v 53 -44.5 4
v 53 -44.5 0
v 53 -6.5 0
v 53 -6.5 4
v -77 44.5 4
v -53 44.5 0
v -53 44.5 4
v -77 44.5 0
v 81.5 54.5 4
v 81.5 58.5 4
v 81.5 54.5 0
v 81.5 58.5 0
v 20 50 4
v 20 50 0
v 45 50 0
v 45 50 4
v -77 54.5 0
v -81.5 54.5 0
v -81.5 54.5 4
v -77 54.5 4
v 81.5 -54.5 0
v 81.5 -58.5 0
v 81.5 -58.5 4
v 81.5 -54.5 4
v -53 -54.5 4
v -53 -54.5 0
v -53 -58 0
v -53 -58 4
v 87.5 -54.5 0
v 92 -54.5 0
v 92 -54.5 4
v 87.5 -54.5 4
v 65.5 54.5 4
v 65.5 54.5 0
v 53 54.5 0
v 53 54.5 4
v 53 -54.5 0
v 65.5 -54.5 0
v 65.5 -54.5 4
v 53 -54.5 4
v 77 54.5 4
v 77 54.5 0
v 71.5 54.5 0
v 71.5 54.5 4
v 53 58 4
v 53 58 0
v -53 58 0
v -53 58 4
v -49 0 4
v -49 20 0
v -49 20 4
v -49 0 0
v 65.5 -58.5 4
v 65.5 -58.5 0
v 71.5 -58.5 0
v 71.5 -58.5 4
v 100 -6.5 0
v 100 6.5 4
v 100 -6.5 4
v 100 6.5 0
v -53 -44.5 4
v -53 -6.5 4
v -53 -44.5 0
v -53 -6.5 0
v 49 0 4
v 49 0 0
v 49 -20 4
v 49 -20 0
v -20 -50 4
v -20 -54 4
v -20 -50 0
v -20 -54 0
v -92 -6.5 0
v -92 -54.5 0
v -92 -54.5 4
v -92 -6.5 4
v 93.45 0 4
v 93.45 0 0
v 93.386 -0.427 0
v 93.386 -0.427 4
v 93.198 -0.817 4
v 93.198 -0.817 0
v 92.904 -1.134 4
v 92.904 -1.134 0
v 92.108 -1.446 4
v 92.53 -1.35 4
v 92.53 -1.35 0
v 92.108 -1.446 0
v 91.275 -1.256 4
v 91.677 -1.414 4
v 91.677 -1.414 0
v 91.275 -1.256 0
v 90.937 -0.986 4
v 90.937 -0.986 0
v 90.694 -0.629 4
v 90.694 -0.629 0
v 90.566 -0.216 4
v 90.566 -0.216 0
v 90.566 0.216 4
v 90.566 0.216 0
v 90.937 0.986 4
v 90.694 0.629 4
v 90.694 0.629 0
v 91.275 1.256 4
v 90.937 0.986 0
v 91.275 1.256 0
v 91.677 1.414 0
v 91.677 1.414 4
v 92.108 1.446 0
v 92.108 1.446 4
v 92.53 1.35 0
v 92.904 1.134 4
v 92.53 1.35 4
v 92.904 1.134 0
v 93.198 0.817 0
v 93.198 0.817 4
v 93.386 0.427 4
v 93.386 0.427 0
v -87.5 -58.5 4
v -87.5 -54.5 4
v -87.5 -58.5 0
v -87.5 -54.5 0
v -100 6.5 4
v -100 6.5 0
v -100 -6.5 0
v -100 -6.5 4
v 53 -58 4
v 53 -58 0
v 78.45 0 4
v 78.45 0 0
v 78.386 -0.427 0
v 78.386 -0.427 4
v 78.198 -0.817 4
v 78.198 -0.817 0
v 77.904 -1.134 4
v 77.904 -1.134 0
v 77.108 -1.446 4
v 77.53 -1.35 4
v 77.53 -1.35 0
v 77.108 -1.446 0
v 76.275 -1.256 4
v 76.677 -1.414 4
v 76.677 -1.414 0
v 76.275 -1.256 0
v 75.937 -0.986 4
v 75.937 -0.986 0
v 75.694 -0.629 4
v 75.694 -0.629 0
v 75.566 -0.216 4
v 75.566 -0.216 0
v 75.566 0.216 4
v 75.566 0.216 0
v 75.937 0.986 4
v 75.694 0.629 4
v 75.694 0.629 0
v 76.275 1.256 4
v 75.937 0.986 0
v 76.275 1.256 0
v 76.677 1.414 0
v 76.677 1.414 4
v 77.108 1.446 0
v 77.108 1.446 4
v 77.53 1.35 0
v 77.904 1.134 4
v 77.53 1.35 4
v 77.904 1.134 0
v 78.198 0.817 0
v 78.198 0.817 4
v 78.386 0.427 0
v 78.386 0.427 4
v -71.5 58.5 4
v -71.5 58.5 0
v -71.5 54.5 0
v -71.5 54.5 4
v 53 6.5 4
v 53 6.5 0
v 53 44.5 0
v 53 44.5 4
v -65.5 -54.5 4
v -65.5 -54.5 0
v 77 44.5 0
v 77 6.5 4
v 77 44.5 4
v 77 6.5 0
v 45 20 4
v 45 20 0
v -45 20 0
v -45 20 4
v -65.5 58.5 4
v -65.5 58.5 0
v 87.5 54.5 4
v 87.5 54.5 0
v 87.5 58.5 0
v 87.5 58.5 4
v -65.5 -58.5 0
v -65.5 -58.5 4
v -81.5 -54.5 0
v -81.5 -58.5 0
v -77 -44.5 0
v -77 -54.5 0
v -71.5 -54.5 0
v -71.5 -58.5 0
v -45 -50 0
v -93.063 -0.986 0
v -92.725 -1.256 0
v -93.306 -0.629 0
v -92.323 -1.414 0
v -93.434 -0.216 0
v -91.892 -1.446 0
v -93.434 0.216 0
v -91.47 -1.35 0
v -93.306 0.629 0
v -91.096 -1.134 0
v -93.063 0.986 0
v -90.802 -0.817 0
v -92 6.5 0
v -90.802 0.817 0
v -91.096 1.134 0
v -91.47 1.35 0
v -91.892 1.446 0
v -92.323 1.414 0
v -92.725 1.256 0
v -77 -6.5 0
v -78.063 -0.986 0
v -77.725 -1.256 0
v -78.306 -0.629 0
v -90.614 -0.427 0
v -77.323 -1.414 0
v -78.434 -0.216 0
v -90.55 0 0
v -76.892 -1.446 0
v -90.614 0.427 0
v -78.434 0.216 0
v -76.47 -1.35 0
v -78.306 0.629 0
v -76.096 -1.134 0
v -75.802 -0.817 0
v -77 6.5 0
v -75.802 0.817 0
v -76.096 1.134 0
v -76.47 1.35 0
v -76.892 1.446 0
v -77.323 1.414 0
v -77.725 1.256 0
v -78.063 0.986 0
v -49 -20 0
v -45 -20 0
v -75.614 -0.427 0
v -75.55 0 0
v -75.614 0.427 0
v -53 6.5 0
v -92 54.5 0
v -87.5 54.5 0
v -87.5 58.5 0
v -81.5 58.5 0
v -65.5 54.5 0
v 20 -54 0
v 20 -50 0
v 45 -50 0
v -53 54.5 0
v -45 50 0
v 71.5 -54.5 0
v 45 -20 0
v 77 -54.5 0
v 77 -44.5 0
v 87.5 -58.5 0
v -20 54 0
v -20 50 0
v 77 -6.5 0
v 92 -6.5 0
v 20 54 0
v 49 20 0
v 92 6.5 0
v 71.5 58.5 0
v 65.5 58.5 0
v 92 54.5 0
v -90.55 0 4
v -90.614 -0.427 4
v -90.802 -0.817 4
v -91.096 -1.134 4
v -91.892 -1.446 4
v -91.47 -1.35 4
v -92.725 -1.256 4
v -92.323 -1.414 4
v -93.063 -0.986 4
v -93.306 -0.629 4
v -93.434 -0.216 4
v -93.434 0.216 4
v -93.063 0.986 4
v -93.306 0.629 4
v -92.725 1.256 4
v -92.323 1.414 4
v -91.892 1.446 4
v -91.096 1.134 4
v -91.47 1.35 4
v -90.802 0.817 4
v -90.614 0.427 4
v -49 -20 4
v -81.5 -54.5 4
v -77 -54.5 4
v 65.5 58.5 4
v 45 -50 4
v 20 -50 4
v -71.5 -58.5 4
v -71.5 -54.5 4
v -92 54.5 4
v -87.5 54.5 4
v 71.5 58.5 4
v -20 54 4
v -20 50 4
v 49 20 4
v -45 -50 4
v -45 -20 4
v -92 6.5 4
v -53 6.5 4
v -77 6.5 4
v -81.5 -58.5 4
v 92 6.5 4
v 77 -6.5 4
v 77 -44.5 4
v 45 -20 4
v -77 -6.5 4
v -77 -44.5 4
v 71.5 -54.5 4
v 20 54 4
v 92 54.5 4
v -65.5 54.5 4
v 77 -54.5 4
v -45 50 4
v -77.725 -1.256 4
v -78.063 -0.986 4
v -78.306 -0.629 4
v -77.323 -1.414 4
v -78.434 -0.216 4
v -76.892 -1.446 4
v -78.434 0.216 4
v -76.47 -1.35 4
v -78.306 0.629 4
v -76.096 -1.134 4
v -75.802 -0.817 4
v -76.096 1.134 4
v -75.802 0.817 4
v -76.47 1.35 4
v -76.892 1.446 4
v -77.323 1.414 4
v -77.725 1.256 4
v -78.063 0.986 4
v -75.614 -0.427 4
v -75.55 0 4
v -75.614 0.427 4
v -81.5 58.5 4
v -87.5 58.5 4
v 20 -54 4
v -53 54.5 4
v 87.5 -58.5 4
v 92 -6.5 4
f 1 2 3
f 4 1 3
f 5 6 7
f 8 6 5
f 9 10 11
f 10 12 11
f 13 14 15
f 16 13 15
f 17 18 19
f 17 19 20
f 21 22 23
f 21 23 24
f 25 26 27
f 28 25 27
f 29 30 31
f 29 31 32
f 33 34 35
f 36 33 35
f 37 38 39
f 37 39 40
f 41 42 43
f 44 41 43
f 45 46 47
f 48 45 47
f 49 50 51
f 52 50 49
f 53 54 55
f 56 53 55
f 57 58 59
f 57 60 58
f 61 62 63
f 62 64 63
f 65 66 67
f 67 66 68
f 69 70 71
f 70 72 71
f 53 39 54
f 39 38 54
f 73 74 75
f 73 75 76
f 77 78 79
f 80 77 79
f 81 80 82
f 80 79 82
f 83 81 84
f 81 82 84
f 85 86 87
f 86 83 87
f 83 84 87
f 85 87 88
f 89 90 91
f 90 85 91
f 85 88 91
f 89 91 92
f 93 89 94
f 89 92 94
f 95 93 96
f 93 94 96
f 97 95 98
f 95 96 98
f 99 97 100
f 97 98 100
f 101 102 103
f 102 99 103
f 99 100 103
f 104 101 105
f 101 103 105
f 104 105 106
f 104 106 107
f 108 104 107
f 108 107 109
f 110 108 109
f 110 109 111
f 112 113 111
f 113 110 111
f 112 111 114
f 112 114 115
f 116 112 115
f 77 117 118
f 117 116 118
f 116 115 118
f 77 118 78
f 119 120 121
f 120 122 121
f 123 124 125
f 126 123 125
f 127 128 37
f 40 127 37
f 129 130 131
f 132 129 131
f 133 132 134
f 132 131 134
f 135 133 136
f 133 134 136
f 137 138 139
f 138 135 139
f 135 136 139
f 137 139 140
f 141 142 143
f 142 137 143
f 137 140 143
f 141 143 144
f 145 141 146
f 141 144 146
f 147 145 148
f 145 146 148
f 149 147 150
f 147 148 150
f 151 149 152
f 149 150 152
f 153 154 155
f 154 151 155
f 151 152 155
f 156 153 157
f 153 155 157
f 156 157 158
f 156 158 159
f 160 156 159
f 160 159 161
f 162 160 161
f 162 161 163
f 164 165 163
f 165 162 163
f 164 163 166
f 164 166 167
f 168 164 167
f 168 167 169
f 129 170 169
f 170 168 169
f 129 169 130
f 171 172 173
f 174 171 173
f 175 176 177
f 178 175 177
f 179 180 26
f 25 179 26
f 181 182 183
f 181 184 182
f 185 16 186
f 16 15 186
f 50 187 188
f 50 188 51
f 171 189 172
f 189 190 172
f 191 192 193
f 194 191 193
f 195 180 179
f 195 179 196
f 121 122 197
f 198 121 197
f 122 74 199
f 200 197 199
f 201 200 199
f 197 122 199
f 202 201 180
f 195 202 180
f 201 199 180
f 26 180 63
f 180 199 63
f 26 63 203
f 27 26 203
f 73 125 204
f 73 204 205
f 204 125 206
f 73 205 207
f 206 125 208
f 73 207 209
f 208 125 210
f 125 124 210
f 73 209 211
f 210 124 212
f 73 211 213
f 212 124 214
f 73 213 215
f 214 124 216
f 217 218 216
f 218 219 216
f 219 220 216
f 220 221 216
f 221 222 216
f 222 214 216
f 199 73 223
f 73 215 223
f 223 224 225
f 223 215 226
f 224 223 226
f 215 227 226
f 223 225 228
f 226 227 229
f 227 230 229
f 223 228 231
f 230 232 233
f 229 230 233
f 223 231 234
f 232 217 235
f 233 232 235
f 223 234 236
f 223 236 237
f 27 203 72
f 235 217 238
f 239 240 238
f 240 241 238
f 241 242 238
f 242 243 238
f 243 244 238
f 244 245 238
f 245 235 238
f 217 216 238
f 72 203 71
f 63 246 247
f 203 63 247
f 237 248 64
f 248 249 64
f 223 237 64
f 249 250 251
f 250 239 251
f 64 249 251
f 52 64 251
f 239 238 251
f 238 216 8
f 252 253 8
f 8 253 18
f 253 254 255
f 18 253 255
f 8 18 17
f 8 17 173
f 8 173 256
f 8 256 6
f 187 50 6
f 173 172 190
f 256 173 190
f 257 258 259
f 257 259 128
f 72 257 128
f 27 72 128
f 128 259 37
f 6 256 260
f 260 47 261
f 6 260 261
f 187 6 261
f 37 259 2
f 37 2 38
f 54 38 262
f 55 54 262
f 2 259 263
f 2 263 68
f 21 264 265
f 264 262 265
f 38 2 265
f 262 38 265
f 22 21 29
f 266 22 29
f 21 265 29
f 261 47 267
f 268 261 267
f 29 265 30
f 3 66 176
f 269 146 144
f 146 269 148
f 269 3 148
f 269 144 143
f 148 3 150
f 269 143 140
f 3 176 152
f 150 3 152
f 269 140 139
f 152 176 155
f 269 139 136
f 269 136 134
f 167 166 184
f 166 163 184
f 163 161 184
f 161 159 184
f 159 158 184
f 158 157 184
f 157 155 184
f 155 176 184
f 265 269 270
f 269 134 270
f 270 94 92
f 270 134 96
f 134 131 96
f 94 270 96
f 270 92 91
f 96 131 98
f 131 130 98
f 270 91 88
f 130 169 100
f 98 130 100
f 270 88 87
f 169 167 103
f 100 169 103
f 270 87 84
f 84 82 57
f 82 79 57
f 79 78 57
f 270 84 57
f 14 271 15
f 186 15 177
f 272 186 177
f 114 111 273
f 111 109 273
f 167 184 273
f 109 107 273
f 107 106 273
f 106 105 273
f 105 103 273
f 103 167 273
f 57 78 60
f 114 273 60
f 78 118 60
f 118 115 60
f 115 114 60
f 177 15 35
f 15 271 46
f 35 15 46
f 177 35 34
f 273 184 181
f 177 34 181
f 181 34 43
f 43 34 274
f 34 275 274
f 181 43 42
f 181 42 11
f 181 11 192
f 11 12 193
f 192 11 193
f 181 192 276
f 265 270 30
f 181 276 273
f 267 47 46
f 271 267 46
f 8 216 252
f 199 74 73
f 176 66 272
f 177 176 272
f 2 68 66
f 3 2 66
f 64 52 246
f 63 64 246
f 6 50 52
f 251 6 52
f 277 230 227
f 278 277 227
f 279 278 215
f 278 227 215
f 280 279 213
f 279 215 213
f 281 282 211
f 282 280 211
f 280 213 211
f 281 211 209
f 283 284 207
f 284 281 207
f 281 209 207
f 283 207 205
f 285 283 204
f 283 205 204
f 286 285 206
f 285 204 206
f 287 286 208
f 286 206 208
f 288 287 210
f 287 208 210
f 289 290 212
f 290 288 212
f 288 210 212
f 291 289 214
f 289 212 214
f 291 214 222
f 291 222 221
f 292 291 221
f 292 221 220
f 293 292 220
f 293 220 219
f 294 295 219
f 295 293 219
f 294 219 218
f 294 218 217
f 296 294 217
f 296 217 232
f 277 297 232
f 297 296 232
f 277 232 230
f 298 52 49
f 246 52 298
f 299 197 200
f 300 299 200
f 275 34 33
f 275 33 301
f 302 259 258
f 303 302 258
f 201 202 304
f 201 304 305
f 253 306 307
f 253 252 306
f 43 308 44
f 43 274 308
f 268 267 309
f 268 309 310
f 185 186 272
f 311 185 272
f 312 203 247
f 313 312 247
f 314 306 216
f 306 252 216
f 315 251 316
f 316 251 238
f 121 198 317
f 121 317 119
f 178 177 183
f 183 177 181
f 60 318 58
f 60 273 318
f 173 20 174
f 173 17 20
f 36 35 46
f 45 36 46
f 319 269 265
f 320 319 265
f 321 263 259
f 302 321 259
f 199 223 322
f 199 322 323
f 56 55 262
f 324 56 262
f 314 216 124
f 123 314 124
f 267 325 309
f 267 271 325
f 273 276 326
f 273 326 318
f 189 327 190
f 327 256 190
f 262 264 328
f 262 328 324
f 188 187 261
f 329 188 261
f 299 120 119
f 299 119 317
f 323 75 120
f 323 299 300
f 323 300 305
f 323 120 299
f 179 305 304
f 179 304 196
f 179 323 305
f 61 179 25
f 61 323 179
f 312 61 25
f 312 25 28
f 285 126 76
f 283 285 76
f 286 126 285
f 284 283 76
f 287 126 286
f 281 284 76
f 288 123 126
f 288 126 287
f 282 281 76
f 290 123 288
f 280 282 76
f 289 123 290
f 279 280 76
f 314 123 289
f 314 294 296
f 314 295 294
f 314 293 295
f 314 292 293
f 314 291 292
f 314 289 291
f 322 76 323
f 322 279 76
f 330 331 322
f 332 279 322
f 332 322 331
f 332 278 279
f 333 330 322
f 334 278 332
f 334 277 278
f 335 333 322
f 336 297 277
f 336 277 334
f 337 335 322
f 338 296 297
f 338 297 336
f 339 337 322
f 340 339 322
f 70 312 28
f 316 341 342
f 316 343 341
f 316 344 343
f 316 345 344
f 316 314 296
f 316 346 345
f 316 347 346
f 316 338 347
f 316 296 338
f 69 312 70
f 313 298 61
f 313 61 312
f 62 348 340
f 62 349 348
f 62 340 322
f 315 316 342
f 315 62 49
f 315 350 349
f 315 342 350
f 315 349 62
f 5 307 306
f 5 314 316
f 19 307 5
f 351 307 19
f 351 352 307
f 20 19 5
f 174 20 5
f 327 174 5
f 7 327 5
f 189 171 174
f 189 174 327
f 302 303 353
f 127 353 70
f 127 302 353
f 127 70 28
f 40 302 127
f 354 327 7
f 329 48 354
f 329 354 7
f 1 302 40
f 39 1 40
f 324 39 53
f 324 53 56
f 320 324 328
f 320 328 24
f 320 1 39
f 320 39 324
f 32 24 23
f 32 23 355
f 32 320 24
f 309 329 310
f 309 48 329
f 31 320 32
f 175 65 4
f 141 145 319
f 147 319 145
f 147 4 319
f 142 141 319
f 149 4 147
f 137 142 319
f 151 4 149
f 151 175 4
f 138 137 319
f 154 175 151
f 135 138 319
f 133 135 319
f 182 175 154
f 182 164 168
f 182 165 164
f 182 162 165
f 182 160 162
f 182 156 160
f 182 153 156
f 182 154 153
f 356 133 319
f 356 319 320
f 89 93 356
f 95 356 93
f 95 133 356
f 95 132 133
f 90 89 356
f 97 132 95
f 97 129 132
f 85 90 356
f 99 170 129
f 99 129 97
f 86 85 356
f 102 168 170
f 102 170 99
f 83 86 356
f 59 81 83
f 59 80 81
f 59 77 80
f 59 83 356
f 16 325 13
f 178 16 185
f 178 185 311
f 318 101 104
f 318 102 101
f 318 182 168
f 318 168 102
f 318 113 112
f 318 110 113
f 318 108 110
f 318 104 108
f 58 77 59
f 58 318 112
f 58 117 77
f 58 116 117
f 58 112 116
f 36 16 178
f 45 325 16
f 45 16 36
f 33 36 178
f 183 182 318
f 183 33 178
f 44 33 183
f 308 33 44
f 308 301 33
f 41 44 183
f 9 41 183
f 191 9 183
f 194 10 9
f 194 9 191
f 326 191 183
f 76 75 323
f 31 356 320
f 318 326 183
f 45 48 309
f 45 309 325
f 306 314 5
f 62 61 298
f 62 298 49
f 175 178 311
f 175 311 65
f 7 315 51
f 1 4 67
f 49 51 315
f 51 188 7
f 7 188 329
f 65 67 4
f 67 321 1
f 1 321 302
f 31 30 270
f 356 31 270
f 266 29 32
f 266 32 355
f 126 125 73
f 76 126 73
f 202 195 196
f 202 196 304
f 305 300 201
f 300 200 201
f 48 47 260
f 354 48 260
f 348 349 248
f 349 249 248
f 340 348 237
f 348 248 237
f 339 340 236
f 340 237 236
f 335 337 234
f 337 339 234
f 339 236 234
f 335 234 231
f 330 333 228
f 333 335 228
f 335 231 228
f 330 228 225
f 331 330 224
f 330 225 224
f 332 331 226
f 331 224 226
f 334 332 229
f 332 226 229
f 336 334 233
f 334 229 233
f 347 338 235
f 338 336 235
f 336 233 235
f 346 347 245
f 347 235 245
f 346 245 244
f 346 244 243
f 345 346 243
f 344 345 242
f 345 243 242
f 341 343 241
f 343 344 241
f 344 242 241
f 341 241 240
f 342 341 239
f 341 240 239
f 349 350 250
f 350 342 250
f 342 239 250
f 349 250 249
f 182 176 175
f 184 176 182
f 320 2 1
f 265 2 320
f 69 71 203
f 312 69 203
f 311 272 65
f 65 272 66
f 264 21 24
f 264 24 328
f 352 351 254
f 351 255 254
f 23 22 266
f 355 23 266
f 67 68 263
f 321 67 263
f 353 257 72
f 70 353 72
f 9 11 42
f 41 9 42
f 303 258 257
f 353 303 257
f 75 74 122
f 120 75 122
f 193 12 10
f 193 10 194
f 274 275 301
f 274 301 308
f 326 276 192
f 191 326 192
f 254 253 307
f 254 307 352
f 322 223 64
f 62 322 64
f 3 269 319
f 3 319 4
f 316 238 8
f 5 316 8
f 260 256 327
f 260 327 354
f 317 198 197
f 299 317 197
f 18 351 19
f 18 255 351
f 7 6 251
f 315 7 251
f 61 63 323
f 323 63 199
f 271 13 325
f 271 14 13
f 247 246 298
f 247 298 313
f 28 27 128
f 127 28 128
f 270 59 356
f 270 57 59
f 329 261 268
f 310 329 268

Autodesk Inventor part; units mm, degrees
ref_plane "YZ Plane" through (0, 0, 0) normal (1, 0, 0) x (0, 1, 0)
ref_plane "XZ Plane" through (0, 0, 0) normal (0, 1, 0) x (-1, 0, 0)
ref_plane "XY Plane" through (0, 0, 0) normal (0, 0, 1) x (1, 0, 0)
sketch "Sketch1" plane through (0, 0, 0) normal (0, 0, 1) x (1, 0, 0)
  line L0 (45, -50) -> (-45, -50)
  line L1 (-45, -50) -> (-45, 50)
  line L2 (-45, 50) -> (45, 50)
  line L3 (45, 50) -> (45, -50)
  line L4 (45, -50) -> (-45, 50) construction
  line L5 (-45, -50) -> (45, 50) construction
  line L6 (53, 58) -> (-53, 58)
  line L7 (-53, 58) -> (-53, 54.5)
  line L8 (-53, -58) -> (53, -58)
  line L9 (53, -58) -> (53, -54.5)
  line L10 (-20, 50) -> (20, 50)
  line L11 (20, 50) -> (20, 54)
  line L12 (20, 54) -> (-20, 54)
  line L13 (-20, 54) -> (-20, 50)
  line L14 (-20, -50) -> (20, -50)
  line L15 (20, -50) -> (20, -54)
  line L16 (20, -54) -> (-20, -54)
  line L17 (-20, -54) -> (-20, -50)
  line L18 (-45, 20) -> (-49, 20)
  line L19 (-49, 20) -> (-49, -20)
  line L20 (-49, -20) -> (-45, -20)
  line L21 (-45, -20) -> (-45, 20)
  line L22 (45, 20) -> (49, 20)
  line L23 (49, 20) -> (49, -20)
  line L24 (49, -20) -> (45, -20)
  line L25 (45, -20) -> (45, 20)
  line L26 (-53, 6.5) -> (-77, 6.5)
  line L27 (-100, 6.5) -> (-100, -6.5)
  line L28 (-100, -6.5) -> (-92, -6.5)
  line L29 (-53, -6.5) -> (-53, 6.5) construction
  line L30 (-53, 0) -> (53, 0)
  circle A0 centre (-92, 0) radius 1.45
  circle A1 centre (-77, 0) radius 1.45
  line L31 (0, 50) -> (0, -50)
  line L32 (-53, 6.5) -> (-53, -6.5) construction
  line L33 (-53, -6.5) -> (-53, -44.5)
  line L34 (53, 6.5) -> (53, 44.5)
  line L35 (53, -6.5) -> (53, 6.5) construction
  line L36 (-92, -6.5) -> (-77, -6.5) construction
  line L37 (-77, -6.5) -> (-77, -44.5)
  line L38 (-77, -58) -> (-92, -58) construction
  line L39 (-92, -58) -> (-92, -54.5) construction
  line L40 (-92, -58) -> (-77, -58) construction
  line L41 (-77, -58) -> (-77, -58.5) construction
  line L42 (-77, -58.5) -> (-81.5, -58.5) construction
  line L43 (-92, -58.5) -> (-92, -58) construction
  line L44 (-92, -54.5) -> (-87.5, -54.5)
  line L45 (-87.5, -54.5) -> (-87.5, -58.5)
  line L46 (-81.5, -58.5) -> (-81.5, -54.5)
  line L47 (-81.5, -54.5) -> (-77, -54.5)
  line L48 (-77, 6.5) -> (-77, 44.5)
  line L49 (-77, 58) -> (-92, 58) construction
  line L50 (-92, 58) -> (-92, 54.5) construction
  line L51 (-92, 58) -> (-77, 58) construction
  line L52 (-77, 58) -> (-77, 58.5) construction
  line L53 (-77, 58.5) -> (-81.5, 58.5) construction
  line L54 (-92, 58.5) -> (-92, 58) construction
  line L55 (-92, 54.5) -> (-87.5, 54.5)
  line L56 (-87.5, 54.5) -> (-87.5, 58.5)
  line L57 (-81.5, 58.5) -> (-81.5, 54.5)
  line L58 (-81.5, 54.5) -> (-77, 54.5)
  line L59 (-77, 6.5) -> (-92, 6.5) construction
  line L60 (-92, 6.5) -> (-100, 6.5)
  line L61 (-92, -6.5) -> (-77, -6.5) construction
  line L62 (-77, -6.5) -> (-53, -6.5)
  line L63 (-77, 54.5) -> (-77, 58) construction
  line L64 (-92, 54.5) -> (-92, 6.5)
  line L65 (-87.5, 58.5) -> (-92, 58.5) construction
  line L66 (-81.5, 58.5) -> (-87.5, 58.5)
  line L67 (-92, -54.5) -> (-92, -6.5)
  line L68 (-87.5, -58.5) -> (-92, -58.5) construction
  line L69 (-81.5, -58.5) -> (-87.5, -58.5)
  line L70 (-77, -54.5) -> (-77, -58) construction
  line L71 (-77, 54.5) -> (-71.5, 54.5)
  line L72 (-53, 54.5) -> (-53, 44.5) construction
  line L73 (-53, 44.5) -> (-77, 44.5)
  line L74 (-77, 44.5) -> (-77, 54.5) construction
  line L75 (-77, -54.5) -> (-71.5, -54.5)
  line L76 (-53, -54.5) -> (-53, -54)
  line L77 (-53, -44.5) -> (-77, -44.5)
  line L78 (-77, -44.5) -> (-77, -54.5) construction
  line L79 (-71.5, 54.5) -> (-65.5, 54.5) construction
  line L80 (-65.5, 54.5) -> (-65.5, 58.5)
  line L81 (-65.5, 58.5) -> (-71.5, 58.5)
  line L82 (-71.5, 58.5) -> (-71.5, 54.5)
  line L83 (-71.5, -54.5) -> (-65.5, -54.5) construction
  line L84 (-65.5, -54.5) -> (-65.5, -58.5)
  line L85 (-65.5, -58.5) -> (-71.5, -58.5)
  line L86 (-71.5, -58.5) -> (-71.5, -54.5)
  line L87 (-71.5, 54.5) -> (-65.5, 54.5) construction
  line L88 (-65.5, 54.5) -> (-53, 54.5)
  line L89 (-77, 44.5) -> (-77, 54.5) construction
  line L90 (-53, 44.5) -> (-53, 6.5)
  line L91 (-53, 54.5) -> (-53, 44.5) construction
  line L92 (-77, -44.5) -> (-77, -54.5) construction
  line L93 (-53, -44.5) -> (-53, -54.5) construction
  line L94 (-53, -54) -> (-53, -44.5) construction
  line L95 (-65.5, -54.5) -> (-53, -54.5)
  line L96 (-71.5, -54.5) -> (-65.5, -54.5) construction
  line L97 (-53, -54.5) -> (-53, -58)
  line L98 (53, 6.5) -> (77, 6.5)
  line L99 (100, 6.5) -> (100, -6.5)
  line L100 (100, -6.5) -> (92, -6.5)
  circle A2 centre (92, 0) radius 1.45
  circle A3 centre (77, 0) radius 1.45
  line L101 (92, -6.5) -> (77, -6.5) construction
  line L102 (77, -6.5) -> (77, -44.5)
  line L103 (77, -58) -> (92, -58) construction
  line L104 (92, -58) -> (92, -54.5) construction
  line L105 (92, -58) -> (77, -58) construction
  line L106 (77, -58) -> (77, -58.5) construction
  line L107 (77, -58.5) -> (81.5, -58.5) construction
  line L108 (92, -58.5) -> (92, -58) construction
  line L109 (92, -54.5) -> (87.5, -54.5)
  line L110 (87.5, -54.5) -> (87.5, -58.5)
  line L111 (81.5, -58.5) -> (81.5, -54.5)
  line L112 (81.5, -54.5) -> (77, -54.5)
  line L113 (92, 54.5) -> (87.5, 54.5)
  line L114 (92, 58) -> (92, 54.5) construction
  line L115 (77, 6.5) -> (77, 44.5)
  line L116 (81.5, 54.5) -> (77, 54.5)
  line L117 (77, 58) -> (92, 58) construction
  line L118 (92, 58) -> (77, 58) construction
  line L119 (77, 58) -> (77, 58.5) construction
  line L120 (77, 58.5) -> (81.5, 58.5) construction
  line L121 (81.5, 58.5) -> (81.5, 54.5)
  line L122 (92, 58.5) -> (92, 58) construction
  line L123 (87.5, 54.5) -> (87.5, 58.5)
  line L124 (77, 6.5) -> (92, 6.5) construction
  line L125 (92, 6.5) -> (100, 6.5)
  line L126 (92, -6.5) -> (77, -6.5) construction
  line L127 (77, -6.5) -> (53, -6.5)
  line L128 (77, 54.5) -> (77, 58) construction
  line L129 (92, 54.5) -> (92, 6.5)
  line L130 (87.5, 58.5) -> (92, 58.5) construction
  line L131 (81.5, 58.5) -> (87.5, 58.5)
  line L132 (92, -54.5) -> (92, -6.5)
  line L133 (87.5, -58.5) -> (92, -58.5) construction
  line L134 (81.5, -58.5) -> (87.5, -58.5)
  line L135 (77, -54.5) -> (77, -58) construction
  line L136 (77, 54.5) -> (71.5, 54.5)
  line L137 (53, 44.5) -> (77, 44.5)
  line L138 (77, 44.5) -> (77, 54.5) construction
  line L139 (77, -54.5) -> (71.5, -54.5)
  line L140 (53, -44.5) -> (77, -44.5)
  line L141 (77, -44.5) -> (77, -54.5) construction
  line L142 (71.5, 54.5) -> (65.5, 54.5) construction
  line L143 (65.5, 54.5) -> (65.5, 58.5)
  line L144 (65.5, 58.5) -> (71.5, 58.5)
  line L145 (71.5, 58.5) -> (71.5, 54.5)
  line L146 (71.5, -54.5) -> (65.5, -54.5) construction
  line L147 (65.5, -54.5) -> (65.5, -58.5)
  line L148 (65.5, -58.5) -> (71.5, -58.5)
  line L149 (71.5, -58.5) -> (71.5, -54.5)
  line L150 (71.5, 54.5) -> (65.5, 54.5) construction
  line L151 (65.5, 54.5) -> (53, 54.5)
  line L152 (77, 44.5) -> (77, 54.5) construction
  line L153 (77, -44.5) -> (77, -54.5) construction
  line L154 (65.5, -54.5) -> (53, -54.5)
  line L155 (71.5, -54.5) -> (65.5, -54.5) construction
  line L156 (53, 44.5) -> (53, 54.5) construction
  line L157 (53, 54.5) -> (53, 58)
  line L158 (53, -44.5) -> (53, -6.5)
  line L159 (53, -54.5) -> (53, -44.5) construction
  point P0 (0, 0)
  point P1 (0, 54)
  point P2 (0, 0)
  point P3 (-49, 0)
  point P4 (0, 0)
  point P5 (-53, 0)
  point P6 (0, 0)
  point P7 (0, 0)
  point P8 (-84.5, -58)
  point P9 (-84.5, 58)
  point P10 (-65, 44.5)
  point P11 (-81.5, 56.5)
  point P12 (-71.5, 56.5)
  point P13 (84.5, -58)
  point P14 (84.5, 58)
  point P15 (65, 44.5)
  point P16 (81.5, 56.5)
  point P17 (71.5, 56.5)
  dimension "d0" = 100
  dimension "d1" = 90
  dimension "d2" = 8
  dimension "d3" = 4
  dimension "d4" = 4
  dimension "d5" = 40
  dimension "d6" = 40
  dimension "d7" = 4
  dimension "d8" = 4
  dimension "d9" = 13
  dimension "d10" = 47
  dimension "d11" = 2.9
  dimension "d12" = 15
  dimension "d13" = 24
  dimension "d14" = 4
  dimension "d15" = 4
  dimension "d16" = 15
  dimension "d17" = 0.5
  dimension "d18" = 6
  dimension "d19" = 4.5
  dimension "d20" = 4.5
  dimension "d21" = 4
  dimension "d24" = 10
  dimension "d25" = 10
  dimension "d27" = 10
  dimension "d28" = 6
extrude "Extrusion1" add sketch "Sketch1" along normal blind 4
properties part number "DoorFrameRear_V2" material "Wood (Oak)"
